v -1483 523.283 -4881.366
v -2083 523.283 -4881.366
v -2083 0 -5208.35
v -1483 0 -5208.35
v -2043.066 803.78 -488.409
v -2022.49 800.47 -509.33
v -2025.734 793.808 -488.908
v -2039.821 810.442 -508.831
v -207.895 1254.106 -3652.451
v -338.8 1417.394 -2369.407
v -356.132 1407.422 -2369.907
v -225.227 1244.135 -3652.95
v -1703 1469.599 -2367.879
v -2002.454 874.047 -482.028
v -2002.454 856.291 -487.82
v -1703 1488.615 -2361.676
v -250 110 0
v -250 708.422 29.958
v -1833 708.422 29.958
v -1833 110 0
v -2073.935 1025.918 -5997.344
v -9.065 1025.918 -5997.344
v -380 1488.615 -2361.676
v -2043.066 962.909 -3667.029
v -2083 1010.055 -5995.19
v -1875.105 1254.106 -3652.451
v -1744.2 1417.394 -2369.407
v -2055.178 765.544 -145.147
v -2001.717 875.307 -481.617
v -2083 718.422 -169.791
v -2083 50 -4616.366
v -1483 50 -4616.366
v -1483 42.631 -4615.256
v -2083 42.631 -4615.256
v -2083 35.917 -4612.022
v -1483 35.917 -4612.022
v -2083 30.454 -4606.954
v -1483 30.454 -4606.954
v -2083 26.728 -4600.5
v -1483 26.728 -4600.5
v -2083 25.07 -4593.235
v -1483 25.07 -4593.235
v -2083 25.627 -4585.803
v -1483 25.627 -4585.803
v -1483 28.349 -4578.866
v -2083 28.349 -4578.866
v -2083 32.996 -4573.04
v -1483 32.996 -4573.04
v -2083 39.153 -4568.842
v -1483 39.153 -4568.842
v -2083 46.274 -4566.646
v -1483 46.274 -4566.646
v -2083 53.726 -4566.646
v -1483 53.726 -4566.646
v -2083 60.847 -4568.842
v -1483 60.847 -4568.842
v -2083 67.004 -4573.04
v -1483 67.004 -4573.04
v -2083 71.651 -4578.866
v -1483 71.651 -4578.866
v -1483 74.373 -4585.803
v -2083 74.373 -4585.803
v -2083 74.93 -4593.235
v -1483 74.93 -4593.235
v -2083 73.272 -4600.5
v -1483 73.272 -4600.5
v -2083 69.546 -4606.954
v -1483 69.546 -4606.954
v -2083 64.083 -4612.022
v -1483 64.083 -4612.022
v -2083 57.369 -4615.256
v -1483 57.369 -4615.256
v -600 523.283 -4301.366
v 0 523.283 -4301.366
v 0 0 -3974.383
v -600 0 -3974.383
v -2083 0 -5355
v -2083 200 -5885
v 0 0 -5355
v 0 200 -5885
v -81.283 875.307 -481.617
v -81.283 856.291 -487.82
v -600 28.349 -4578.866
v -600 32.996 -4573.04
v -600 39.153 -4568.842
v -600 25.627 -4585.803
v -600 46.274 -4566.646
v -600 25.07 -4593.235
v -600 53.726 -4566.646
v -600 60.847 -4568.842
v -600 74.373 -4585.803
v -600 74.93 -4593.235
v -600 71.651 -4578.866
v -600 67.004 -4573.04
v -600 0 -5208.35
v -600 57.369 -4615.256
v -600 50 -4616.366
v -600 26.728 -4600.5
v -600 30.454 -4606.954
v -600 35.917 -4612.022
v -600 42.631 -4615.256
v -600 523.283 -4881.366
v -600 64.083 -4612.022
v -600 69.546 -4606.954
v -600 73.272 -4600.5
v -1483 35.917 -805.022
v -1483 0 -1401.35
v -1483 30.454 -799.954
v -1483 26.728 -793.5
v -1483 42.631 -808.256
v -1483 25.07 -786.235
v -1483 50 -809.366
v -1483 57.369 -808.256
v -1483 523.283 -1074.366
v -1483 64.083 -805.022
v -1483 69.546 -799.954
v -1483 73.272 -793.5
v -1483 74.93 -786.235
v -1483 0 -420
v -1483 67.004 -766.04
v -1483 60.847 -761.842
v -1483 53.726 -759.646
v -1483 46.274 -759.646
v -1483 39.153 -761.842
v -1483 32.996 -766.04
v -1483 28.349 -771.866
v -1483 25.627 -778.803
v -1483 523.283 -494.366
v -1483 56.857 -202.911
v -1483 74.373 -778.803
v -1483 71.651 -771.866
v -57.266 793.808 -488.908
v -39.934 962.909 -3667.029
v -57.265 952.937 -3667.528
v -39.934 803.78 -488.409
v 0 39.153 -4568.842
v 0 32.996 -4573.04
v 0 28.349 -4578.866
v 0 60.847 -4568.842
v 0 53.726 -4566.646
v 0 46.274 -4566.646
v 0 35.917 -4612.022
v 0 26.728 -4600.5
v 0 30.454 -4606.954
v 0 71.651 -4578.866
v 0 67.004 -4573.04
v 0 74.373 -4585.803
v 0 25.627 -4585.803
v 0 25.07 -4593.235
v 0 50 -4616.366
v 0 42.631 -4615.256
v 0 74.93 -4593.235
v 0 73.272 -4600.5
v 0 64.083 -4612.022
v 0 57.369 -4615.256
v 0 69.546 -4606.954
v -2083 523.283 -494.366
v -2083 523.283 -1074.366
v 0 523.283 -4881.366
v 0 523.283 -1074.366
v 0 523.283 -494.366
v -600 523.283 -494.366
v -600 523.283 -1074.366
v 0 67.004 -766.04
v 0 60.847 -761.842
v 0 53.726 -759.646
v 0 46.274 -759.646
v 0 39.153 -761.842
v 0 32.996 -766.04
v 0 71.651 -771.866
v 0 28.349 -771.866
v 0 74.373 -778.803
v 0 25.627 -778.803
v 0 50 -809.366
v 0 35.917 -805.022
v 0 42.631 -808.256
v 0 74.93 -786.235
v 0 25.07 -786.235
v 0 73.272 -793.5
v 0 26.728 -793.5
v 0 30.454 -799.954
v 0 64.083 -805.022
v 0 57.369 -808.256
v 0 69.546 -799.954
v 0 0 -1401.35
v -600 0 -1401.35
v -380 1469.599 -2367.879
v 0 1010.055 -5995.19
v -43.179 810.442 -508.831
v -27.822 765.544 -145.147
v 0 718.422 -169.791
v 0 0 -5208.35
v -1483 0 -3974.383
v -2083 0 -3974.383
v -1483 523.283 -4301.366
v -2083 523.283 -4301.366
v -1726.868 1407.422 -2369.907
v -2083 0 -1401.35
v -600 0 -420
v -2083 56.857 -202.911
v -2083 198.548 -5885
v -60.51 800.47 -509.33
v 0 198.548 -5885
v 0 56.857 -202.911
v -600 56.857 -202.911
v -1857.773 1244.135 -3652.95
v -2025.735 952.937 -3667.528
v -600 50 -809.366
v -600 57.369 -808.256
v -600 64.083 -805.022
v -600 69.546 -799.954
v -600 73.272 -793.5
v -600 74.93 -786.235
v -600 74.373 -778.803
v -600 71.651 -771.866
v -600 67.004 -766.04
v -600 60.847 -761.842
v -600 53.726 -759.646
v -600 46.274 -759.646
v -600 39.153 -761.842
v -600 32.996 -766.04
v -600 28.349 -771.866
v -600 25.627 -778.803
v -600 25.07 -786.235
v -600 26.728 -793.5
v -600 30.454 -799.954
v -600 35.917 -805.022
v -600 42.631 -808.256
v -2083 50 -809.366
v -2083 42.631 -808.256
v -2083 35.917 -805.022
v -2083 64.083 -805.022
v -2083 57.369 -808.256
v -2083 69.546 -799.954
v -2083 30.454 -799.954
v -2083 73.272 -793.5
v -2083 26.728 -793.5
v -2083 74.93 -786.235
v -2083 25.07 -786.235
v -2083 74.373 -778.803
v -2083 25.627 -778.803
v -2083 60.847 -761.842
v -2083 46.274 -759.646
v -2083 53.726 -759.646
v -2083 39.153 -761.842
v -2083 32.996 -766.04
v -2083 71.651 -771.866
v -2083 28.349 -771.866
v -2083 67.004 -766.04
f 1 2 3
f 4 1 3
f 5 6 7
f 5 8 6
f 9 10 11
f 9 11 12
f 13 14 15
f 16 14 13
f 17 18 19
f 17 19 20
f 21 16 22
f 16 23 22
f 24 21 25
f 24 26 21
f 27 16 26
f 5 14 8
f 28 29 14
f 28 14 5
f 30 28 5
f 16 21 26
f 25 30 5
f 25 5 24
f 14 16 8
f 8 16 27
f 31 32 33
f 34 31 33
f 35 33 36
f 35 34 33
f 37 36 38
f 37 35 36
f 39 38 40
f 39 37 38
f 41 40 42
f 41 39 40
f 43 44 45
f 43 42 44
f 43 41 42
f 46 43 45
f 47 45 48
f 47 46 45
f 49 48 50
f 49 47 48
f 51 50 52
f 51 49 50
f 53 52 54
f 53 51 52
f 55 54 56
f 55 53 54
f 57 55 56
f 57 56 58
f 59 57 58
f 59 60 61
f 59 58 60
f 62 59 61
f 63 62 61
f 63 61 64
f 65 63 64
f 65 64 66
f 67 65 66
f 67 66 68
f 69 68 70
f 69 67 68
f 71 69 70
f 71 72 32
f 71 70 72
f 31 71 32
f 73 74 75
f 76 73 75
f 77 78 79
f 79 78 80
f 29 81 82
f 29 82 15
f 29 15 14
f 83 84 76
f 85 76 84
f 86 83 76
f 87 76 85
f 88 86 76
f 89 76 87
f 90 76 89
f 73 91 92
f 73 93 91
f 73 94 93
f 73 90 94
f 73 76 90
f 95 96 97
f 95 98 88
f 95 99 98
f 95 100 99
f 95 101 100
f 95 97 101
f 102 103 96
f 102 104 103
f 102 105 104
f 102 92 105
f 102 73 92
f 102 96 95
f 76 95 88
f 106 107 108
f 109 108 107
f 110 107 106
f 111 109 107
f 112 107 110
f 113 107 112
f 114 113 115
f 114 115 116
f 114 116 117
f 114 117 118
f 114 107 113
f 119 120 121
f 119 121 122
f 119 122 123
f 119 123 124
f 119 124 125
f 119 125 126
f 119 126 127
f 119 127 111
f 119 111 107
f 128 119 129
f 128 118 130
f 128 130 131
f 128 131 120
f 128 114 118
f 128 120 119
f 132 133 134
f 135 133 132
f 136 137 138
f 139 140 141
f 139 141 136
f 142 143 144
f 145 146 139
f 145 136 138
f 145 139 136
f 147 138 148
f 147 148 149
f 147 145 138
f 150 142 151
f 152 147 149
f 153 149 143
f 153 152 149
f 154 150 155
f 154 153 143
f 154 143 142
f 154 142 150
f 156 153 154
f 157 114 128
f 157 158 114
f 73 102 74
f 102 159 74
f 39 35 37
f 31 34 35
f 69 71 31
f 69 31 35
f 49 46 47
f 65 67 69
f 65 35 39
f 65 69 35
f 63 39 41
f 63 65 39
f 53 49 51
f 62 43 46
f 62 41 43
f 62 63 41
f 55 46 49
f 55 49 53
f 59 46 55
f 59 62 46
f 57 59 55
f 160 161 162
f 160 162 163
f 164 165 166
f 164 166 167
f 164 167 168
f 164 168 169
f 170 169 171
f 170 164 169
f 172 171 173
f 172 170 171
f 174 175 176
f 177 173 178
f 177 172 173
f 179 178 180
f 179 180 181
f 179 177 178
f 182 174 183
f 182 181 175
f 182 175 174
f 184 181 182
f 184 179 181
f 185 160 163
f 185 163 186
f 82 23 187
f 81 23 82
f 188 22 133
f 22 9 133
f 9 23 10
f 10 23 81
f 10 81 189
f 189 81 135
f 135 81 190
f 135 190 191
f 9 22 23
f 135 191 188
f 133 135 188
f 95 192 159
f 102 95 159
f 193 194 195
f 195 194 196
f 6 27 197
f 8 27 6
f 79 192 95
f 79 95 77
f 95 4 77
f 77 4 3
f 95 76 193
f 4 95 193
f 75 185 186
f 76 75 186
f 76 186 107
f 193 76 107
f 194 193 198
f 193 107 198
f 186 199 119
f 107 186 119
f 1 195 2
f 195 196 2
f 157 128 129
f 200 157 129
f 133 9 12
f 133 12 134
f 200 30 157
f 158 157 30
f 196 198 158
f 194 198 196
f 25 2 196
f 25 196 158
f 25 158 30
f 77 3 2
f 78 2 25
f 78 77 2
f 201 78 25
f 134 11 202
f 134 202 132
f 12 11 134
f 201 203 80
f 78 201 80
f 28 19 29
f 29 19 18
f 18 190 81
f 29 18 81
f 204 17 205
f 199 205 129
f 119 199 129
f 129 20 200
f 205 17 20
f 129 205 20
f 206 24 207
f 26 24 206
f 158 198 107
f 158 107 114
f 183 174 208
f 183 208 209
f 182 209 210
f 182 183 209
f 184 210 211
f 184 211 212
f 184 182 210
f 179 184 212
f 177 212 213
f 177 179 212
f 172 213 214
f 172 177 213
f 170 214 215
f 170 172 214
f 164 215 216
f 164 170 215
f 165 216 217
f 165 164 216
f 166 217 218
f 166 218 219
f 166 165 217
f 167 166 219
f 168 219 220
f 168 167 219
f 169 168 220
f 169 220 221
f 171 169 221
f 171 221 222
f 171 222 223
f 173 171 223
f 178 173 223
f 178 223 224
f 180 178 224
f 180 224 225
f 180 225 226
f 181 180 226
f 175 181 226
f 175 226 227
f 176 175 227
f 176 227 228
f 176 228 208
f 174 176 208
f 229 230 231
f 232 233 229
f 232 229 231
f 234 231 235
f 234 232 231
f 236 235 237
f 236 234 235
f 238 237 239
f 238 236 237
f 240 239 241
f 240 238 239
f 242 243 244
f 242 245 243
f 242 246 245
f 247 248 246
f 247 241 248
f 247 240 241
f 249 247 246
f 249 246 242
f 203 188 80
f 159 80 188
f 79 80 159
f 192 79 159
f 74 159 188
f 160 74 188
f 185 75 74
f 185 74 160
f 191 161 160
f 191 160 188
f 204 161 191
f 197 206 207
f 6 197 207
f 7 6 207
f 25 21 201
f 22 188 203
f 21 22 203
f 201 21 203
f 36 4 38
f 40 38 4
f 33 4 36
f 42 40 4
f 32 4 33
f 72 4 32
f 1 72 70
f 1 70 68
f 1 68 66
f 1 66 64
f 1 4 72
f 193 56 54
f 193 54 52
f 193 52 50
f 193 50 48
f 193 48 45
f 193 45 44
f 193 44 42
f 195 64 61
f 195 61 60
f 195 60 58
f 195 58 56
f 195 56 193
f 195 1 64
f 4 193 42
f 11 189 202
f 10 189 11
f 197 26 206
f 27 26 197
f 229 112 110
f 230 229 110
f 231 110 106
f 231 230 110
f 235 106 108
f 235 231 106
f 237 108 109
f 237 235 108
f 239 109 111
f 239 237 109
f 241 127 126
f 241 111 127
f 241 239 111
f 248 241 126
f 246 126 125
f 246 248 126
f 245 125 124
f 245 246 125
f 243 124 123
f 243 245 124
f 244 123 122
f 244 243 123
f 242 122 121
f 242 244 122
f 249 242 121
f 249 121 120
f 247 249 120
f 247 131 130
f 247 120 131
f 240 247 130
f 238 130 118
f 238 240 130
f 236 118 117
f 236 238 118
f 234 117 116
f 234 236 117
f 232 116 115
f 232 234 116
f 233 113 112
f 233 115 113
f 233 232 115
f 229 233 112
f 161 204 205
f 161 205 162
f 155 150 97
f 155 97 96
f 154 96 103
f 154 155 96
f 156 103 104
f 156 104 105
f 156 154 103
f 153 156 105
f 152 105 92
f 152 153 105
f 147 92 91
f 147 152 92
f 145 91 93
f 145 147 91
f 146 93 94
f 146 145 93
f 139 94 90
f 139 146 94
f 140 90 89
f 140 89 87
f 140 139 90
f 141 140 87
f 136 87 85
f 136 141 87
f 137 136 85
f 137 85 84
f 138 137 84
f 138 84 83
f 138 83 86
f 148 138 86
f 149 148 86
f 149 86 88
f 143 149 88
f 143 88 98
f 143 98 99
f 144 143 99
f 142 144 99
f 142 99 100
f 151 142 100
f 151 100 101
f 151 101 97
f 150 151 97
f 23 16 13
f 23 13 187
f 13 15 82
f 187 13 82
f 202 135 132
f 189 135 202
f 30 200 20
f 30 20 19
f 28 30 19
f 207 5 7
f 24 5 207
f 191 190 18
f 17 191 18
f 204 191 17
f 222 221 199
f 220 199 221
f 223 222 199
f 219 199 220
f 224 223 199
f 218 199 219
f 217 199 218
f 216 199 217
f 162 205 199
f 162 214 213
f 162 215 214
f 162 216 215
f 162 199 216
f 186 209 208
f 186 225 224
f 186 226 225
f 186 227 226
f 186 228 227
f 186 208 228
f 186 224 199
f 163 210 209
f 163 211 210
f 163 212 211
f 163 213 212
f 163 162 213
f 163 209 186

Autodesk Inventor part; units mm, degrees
ref_plane "YZ Plane" through (0, 0, 0) normal (1, 0, 0) x (0, 1, 0)
sketch "Sketch1" plane through (0, 0, 0) normal (0, 1, 0) x (-1, 0, 0)
  line L0 (0, 0) -> (2083, 0)
  line L1 (2083, 0) -> (2083, -5885)
  line L2 (2083, -5885) -> (0, -5885)
  line L3 (0, -5885) -> (0, 0)
  dimension "d0" = 2083
  dimension "d1" = 5885
extrude "Extrusion1" add sketch "Sketch1" along normal blind 710
sketch "Sketch2" plane through (0, 0, 0) normal (1, 0, 0) x (0, 0, -1)
  line L0 (0, 710) -> (5885, 710) projected
  line L1 (5885, 710) -> (5885, 1020)
  line L2 (5885, 710) -> (6195, 710) construction
  line L3 (5885, 1020) -> (0, 710)
  line L4 (0, 710) -> (5885, 710)
  point P0 (0, 0)
  dimension "d4" = 310
  dimension "d5" = 90
extrude "Extrusion2" add sketch "Sketch2" against normal up to surface (2083 mm away)
chamfer "Chamfer1" distance 420 distance2 110 1 edges at (-1041.5, 0, 0) measured on face at (-694.3333, 0, -1961.6667)
chamfer "Chamfer2" distance 530 distance2 200 1 edges at (-1041.5, 0, -5885) measured on face at (-694.3333, 0, -2241.6667)
sketch "Sketch3" plane through (0, 110, 0) normal (1, 0, 0) x (0, 0, -1)
  line L0 (0, 600) -> (-29.9585, 598.4219)
  line L1 (5885, 910) -> (0, 600) construction
  line L2 (5885, 910) -> (5997.3442, 915.9179)
  line L3 (5885, 88.5481) -> (5885, 910)
  line L4 (5997.3442, 915.9179) -> (5885, 88.5481)
  line L5 (0, 600) -> (0, 0)
  line L6 (-29.9585, 598.4219) -> (0, 0)
  dimension "d14" = 30
  dimension "d15" = 112.5
extrude "Extrusion3" add sketch "Sketch3" against normal up to surface (2083 mm away)
sketch "Sketch4" plane through (0, 0, -420) normal (1, 0, 0) x (0, 0, -1)
  line L0 (5577.3442, 1025.9179) -> (-449.9585, 708.4219) projected
  line L1 (-449.9585, 708.4219) -> (1941.6755, 1488.6146)
  line L2 (1941.6755, 1488.6146) -> (5577.3442, 1025.9179)
  line L3 (5577.3442, 1025.9179) -> (-449.9585, 708.4219)
  line L4 (1941.6755, 1488.6146) -> (1976.0415, 836.2146)
  point P0 (-420, 0)
  dimension "d20" = 2426
  dimension "d21" = 652.4
extrude "Extrusion4" add sketch "Sketch4" against normal up to surface (2083 mm away)
ref_plane "Work Plane3" through (0, 708.4219, 29.9585) normal (0, -0.0499998, 0.9987492) x (1, 0, 0)
sketch "Sketch6" plane through (0, 708.4219, 29.9585) normal (0, -0.0499998, 0.9987492) x (1, 0, 0)
  line L0 (-2083, 659.6356) -> (-2083, 0) construction
  line L1 (0, 0) -> (-2083, 0) construction
  line L2 (0, 659.6356) -> (0, 0) construction
  line L3 (0, 659.6356) -> (-2083, 659.6356) construction
  line L4 (0, 0) -> (0, 659.6356)
  line L5 (0, 659.6356) -> (-380, 659.6356)
  line L6 (-380, 659.6356) -> (0, 0)
  line L7 (0, 659.6356) -> (0, 0) construction
  line L8 (-2083, 659.6356) -> (-2083, 0) construction
  line L9 (0, 0) -> (-2083, 0) construction
  line L10 (0, 0) -> (-2083, 0) projected
  line L11 (-1041.5, 0) -> (-1041.5, 659.6356) construction
  line L12 (-2083, 659.6356) -> (-2083, 0) construction
  line L13 (-2083, 0) -> (-2083, 659.6356)
  line L14 (-2083, 659.6356) -> (-1703, 659.6356)
  line L15 (-1703, 659.6356) -> (-2083, 0)
  line L16 (-2083, 659.6356) -> (-2083, 0) construction
  point P0 (0, -709.0337)
  dimension "d24" = 380
extrude "Extrusion5" cut sketch "Sketch6" against normal up to surface surface through (0, 1025.9179, -5997.3442) normal (0, -0.1345501, -0.9909068)
chamfer "Chamfer3" distance 250 distance2 200 1 edges at (0, 409.2109, 14.9792) measured on face at (-1388.6667, 309.474, 9.9862)
chamfer "Chamfer4" distance 250 distance2 200 1 edges at (-2083, 409.2109, 14.9792) measured on face at (-1472, 309.474, 9.9862)
sketch "Sketch7" plane through (-1703, 1488.6146, -2361.6755) normal (0, 0.9506933, 0.3101327) x (1, 0, 0)
  line L0 (0, 0) -> (1323, 0)
  line L1 (1323, 0) -> (1621.7173, -1977.5662)
  line L2 (1621.7173, -1977.5662) -> (-299.4539, -1977.5662)
  line L3 (-370.9356, 3312.9084) -> (0, 0) projected
  line L4 (-299.4539, -1977.5662) -> (0, 0)
  point P0 (1703, -2706.8971)
  dimension "d33" = 2000
extrude "Extrusion6" cut sketch "Sketch7" against normal blind 20
sketch "Sketch8" plane through (0, 718.4219, -169.7914) normal (0.8665032, 0.4985471, 0.0249585) x (0, 0.0499998, -0.9987492)
  line L0 (0, 0) -> (-22.2576, 55.7363) projected
  line L1 (5832.6944, 0) -> (0, 0) projected
  line L2 (5835.6387, 18.1589) -> (5832.6944, 0) projected
  line L3 (2227.6521, 761.2615) -> (5835.6387, 18.1589) projected
  line L4 (319.2795, 162.8353) -> (2227.6521, 761.2615) projected
  line L5 (-22.2576, 55.7363) -> (319.2795, 162.8353) projected
  line L6 (5138.8046, 80) -> (322.4868, 80)
  line L7 (322.4868, 80) -> (343.2165, 86.5004)
  line L8 (343.2165, 86.5004) -> (2231.8133, 678.7253)
  line L9 (2231.8133, 678.7253) -> (5138.8046, 80)
  line L10 (2231.8133, 678.7253) -> (3505.0878, 416.4811)
  line L11 (3505.0878, 416.4811) -> (3505.0878, 80)
  point P0 (-205.5, -614.38)
  dimension "d36" = 80
  dimension "d37" = 1300
extrude "Extrusion7" cut sketch "Sketch8" against normal blind 20 contours L6 L7 L8 L9 L11
ref_plane "Work Plane5" through (-1041.5, 0, -420) normal (1, 0, 0) x (0, 0, -1)
mirror "Mirror1" about plane through (-1041.5, 0, -420) normal (1, 0, 0) of "Extrusion7"
sketch "Sketch9" plane through (0, 718.4219, -169.7914) normal (0.8665032, 0.4985471, 0.0249585) x (0, 0.0499998, -0.9987492)
  point P0 (-205.5, -614.38)
sketch "Sketch11" plane through (0, 0, -420) normal (1, 0, 0) x (0, 0, -1)
  line L0 (-217.089, 56.8567) -> (-250.2086, 718.4219) construction
  line L1 (-217.089, 56.8567) -> (-250.2086, 718.4219) construction
  line L2 (0, 0) -> (-217.089, 56.8567) construction
  line L3 (4935, 0) -> (0, 0) construction
  line L4 (5465, 200) -> (4935, 0) construction
  line L5 (5465, 198.5481) -> (5465, 200) construction
  line L6 (5575.1904, 1010.0556) -> (5465, 198.5481) construction
  line L7 (5575.1904, 1010.0556) -> (-250.2086, 718.4219) construction
  line L8 (-217.089, 56.8567) -> (74.3665, 523.2831)
  line L9 (-217.089, 56.8567) -> (332.911, 56.8567) construction
  line L10 (74.3665, 523.2831) -> (654.3665, 523.2831)
  line L11 (654.3665, 523.2831) -> (981.3501, 0)
  line L12 (0, 0) -> (-217.089, 56.8567) projected
  line L13 (-217.089, 56.8567) -> (0, 0)
  line L14 (0, 0) -> (981.3501, 0)
  line L15 (364.3665, 523.2831) -> (364.3665, 0) construction
  line L16 (0, 0) -> (4935, 0) construction
  line L17 (364.3665, 0) -> (4171.3665, 0) construction
  line L18 (2267.8665, 0) -> (2267.8665, 523.2831) construction
  line L19 (4788.3501, 0) -> (4461.3665, 523.2831)
  line L20 (4461.3665, 523.2831) -> (3881.3665, 523.2831)
  line L21 (3881.3665, 523.2831) -> (3554.383, 0)
  line L22 (4788.3501, 0) -> (3554.383, 0)
  point P0 (-420, 0)
  point P1 (4752.8221, 56.8567)
  dimension "d44" = 550
  dimension "d45" = 58
  dimension "d46" = 580
  dimension "d47" = 122
  dimension "d48" = 3807
extrude "Extrusion9" cut sketch "Sketch11" against normal blind 600
mirror "Mirror2" about plane through (-1041.5, 0, -420) normal (1, 0, 0) of "Extrusion9"
sketch "Sketch12" plane through (0, 0, -1401.3501) normal (1, 0, 0) x (0, 0, -1)
  line L0 (-326.9836, 523.2831) -> (0, 0) construction
  line L1 (2573.0328, 0) -> (0, 0) construction
  line L2 (2573.0328, 0) -> (2900.0164, 523.2831) construction
  line L3 (2900.0164, 523.2831) -> (3480.0164, 523.2831) construction
  line L4 (3480.0164, 523.2831) -> (3807, 0) construction
  line L5 (3953.6499, 0) -> (3807, 0) construction
  line L6 (4483.6499, 200) -> (3953.6499, 0) construction
  line L7 (4483.6499, 198.5481) -> (4483.6499, 200) construction
  line L8 (4593.8403, 1010.0556) -> (4483.6499, 198.5481) construction
  line L9 (4593.8403, 1010.0556) -> (-1231.5587, 718.4219) construction
  line L10 (-1198.4392, 56.8567) -> (-1231.5587, 718.4219) construction
  line L11 (-1198.4392, 56.8567) -> (-906.9836, 523.2831) construction
  line L12 (-906.9836, 523.2831) -> (-326.9836, 523.2831) construction
  line L13 (0, 0) -> (-981.3501, 0) construction
  line L14 (-326.9836, 523.2831) -> (0, 0) construction
  line L15 (-906.9836, 523.2831) -> (-326.9836, 523.2831) construction
  line L16 (-1198.4392, 56.8567) -> (-906.9836, 523.2831) construction
  line L17 (-981.3501, 0) -> (-1198.4392, 56.8567) construction
  line L18 (-326.9836, 523.2831) -> (-906.9836, 523.2831) construction
  line L19 (-616.9836, 523.2831) -> (-616.9836, 0) construction
  line L20 (-981.3501, 0) -> (0, 0) construction
  line L21 (2573.0328, 0) -> (0, 0) construction
  line L22 (1286.5164, 0) -> (1286.5164, 696.1124) construction
  circle A0 centre (-616.9836, 50) radius 25
  circle A1 centre (3190.0164, 50) radius 25
  point P0 (-1401.3501, 0)
  dimension "d51" = 50
  dimension "d53" = 50
extrude "Extrusion10" add sketch "Sketch12" against normal up to surface (600 mm away)
mirror "Mirror3" about plane through (-1041.5, 0, -420) normal (1, 0, 0) of "Extrusion10"
properties part number "02Cybertruck"
